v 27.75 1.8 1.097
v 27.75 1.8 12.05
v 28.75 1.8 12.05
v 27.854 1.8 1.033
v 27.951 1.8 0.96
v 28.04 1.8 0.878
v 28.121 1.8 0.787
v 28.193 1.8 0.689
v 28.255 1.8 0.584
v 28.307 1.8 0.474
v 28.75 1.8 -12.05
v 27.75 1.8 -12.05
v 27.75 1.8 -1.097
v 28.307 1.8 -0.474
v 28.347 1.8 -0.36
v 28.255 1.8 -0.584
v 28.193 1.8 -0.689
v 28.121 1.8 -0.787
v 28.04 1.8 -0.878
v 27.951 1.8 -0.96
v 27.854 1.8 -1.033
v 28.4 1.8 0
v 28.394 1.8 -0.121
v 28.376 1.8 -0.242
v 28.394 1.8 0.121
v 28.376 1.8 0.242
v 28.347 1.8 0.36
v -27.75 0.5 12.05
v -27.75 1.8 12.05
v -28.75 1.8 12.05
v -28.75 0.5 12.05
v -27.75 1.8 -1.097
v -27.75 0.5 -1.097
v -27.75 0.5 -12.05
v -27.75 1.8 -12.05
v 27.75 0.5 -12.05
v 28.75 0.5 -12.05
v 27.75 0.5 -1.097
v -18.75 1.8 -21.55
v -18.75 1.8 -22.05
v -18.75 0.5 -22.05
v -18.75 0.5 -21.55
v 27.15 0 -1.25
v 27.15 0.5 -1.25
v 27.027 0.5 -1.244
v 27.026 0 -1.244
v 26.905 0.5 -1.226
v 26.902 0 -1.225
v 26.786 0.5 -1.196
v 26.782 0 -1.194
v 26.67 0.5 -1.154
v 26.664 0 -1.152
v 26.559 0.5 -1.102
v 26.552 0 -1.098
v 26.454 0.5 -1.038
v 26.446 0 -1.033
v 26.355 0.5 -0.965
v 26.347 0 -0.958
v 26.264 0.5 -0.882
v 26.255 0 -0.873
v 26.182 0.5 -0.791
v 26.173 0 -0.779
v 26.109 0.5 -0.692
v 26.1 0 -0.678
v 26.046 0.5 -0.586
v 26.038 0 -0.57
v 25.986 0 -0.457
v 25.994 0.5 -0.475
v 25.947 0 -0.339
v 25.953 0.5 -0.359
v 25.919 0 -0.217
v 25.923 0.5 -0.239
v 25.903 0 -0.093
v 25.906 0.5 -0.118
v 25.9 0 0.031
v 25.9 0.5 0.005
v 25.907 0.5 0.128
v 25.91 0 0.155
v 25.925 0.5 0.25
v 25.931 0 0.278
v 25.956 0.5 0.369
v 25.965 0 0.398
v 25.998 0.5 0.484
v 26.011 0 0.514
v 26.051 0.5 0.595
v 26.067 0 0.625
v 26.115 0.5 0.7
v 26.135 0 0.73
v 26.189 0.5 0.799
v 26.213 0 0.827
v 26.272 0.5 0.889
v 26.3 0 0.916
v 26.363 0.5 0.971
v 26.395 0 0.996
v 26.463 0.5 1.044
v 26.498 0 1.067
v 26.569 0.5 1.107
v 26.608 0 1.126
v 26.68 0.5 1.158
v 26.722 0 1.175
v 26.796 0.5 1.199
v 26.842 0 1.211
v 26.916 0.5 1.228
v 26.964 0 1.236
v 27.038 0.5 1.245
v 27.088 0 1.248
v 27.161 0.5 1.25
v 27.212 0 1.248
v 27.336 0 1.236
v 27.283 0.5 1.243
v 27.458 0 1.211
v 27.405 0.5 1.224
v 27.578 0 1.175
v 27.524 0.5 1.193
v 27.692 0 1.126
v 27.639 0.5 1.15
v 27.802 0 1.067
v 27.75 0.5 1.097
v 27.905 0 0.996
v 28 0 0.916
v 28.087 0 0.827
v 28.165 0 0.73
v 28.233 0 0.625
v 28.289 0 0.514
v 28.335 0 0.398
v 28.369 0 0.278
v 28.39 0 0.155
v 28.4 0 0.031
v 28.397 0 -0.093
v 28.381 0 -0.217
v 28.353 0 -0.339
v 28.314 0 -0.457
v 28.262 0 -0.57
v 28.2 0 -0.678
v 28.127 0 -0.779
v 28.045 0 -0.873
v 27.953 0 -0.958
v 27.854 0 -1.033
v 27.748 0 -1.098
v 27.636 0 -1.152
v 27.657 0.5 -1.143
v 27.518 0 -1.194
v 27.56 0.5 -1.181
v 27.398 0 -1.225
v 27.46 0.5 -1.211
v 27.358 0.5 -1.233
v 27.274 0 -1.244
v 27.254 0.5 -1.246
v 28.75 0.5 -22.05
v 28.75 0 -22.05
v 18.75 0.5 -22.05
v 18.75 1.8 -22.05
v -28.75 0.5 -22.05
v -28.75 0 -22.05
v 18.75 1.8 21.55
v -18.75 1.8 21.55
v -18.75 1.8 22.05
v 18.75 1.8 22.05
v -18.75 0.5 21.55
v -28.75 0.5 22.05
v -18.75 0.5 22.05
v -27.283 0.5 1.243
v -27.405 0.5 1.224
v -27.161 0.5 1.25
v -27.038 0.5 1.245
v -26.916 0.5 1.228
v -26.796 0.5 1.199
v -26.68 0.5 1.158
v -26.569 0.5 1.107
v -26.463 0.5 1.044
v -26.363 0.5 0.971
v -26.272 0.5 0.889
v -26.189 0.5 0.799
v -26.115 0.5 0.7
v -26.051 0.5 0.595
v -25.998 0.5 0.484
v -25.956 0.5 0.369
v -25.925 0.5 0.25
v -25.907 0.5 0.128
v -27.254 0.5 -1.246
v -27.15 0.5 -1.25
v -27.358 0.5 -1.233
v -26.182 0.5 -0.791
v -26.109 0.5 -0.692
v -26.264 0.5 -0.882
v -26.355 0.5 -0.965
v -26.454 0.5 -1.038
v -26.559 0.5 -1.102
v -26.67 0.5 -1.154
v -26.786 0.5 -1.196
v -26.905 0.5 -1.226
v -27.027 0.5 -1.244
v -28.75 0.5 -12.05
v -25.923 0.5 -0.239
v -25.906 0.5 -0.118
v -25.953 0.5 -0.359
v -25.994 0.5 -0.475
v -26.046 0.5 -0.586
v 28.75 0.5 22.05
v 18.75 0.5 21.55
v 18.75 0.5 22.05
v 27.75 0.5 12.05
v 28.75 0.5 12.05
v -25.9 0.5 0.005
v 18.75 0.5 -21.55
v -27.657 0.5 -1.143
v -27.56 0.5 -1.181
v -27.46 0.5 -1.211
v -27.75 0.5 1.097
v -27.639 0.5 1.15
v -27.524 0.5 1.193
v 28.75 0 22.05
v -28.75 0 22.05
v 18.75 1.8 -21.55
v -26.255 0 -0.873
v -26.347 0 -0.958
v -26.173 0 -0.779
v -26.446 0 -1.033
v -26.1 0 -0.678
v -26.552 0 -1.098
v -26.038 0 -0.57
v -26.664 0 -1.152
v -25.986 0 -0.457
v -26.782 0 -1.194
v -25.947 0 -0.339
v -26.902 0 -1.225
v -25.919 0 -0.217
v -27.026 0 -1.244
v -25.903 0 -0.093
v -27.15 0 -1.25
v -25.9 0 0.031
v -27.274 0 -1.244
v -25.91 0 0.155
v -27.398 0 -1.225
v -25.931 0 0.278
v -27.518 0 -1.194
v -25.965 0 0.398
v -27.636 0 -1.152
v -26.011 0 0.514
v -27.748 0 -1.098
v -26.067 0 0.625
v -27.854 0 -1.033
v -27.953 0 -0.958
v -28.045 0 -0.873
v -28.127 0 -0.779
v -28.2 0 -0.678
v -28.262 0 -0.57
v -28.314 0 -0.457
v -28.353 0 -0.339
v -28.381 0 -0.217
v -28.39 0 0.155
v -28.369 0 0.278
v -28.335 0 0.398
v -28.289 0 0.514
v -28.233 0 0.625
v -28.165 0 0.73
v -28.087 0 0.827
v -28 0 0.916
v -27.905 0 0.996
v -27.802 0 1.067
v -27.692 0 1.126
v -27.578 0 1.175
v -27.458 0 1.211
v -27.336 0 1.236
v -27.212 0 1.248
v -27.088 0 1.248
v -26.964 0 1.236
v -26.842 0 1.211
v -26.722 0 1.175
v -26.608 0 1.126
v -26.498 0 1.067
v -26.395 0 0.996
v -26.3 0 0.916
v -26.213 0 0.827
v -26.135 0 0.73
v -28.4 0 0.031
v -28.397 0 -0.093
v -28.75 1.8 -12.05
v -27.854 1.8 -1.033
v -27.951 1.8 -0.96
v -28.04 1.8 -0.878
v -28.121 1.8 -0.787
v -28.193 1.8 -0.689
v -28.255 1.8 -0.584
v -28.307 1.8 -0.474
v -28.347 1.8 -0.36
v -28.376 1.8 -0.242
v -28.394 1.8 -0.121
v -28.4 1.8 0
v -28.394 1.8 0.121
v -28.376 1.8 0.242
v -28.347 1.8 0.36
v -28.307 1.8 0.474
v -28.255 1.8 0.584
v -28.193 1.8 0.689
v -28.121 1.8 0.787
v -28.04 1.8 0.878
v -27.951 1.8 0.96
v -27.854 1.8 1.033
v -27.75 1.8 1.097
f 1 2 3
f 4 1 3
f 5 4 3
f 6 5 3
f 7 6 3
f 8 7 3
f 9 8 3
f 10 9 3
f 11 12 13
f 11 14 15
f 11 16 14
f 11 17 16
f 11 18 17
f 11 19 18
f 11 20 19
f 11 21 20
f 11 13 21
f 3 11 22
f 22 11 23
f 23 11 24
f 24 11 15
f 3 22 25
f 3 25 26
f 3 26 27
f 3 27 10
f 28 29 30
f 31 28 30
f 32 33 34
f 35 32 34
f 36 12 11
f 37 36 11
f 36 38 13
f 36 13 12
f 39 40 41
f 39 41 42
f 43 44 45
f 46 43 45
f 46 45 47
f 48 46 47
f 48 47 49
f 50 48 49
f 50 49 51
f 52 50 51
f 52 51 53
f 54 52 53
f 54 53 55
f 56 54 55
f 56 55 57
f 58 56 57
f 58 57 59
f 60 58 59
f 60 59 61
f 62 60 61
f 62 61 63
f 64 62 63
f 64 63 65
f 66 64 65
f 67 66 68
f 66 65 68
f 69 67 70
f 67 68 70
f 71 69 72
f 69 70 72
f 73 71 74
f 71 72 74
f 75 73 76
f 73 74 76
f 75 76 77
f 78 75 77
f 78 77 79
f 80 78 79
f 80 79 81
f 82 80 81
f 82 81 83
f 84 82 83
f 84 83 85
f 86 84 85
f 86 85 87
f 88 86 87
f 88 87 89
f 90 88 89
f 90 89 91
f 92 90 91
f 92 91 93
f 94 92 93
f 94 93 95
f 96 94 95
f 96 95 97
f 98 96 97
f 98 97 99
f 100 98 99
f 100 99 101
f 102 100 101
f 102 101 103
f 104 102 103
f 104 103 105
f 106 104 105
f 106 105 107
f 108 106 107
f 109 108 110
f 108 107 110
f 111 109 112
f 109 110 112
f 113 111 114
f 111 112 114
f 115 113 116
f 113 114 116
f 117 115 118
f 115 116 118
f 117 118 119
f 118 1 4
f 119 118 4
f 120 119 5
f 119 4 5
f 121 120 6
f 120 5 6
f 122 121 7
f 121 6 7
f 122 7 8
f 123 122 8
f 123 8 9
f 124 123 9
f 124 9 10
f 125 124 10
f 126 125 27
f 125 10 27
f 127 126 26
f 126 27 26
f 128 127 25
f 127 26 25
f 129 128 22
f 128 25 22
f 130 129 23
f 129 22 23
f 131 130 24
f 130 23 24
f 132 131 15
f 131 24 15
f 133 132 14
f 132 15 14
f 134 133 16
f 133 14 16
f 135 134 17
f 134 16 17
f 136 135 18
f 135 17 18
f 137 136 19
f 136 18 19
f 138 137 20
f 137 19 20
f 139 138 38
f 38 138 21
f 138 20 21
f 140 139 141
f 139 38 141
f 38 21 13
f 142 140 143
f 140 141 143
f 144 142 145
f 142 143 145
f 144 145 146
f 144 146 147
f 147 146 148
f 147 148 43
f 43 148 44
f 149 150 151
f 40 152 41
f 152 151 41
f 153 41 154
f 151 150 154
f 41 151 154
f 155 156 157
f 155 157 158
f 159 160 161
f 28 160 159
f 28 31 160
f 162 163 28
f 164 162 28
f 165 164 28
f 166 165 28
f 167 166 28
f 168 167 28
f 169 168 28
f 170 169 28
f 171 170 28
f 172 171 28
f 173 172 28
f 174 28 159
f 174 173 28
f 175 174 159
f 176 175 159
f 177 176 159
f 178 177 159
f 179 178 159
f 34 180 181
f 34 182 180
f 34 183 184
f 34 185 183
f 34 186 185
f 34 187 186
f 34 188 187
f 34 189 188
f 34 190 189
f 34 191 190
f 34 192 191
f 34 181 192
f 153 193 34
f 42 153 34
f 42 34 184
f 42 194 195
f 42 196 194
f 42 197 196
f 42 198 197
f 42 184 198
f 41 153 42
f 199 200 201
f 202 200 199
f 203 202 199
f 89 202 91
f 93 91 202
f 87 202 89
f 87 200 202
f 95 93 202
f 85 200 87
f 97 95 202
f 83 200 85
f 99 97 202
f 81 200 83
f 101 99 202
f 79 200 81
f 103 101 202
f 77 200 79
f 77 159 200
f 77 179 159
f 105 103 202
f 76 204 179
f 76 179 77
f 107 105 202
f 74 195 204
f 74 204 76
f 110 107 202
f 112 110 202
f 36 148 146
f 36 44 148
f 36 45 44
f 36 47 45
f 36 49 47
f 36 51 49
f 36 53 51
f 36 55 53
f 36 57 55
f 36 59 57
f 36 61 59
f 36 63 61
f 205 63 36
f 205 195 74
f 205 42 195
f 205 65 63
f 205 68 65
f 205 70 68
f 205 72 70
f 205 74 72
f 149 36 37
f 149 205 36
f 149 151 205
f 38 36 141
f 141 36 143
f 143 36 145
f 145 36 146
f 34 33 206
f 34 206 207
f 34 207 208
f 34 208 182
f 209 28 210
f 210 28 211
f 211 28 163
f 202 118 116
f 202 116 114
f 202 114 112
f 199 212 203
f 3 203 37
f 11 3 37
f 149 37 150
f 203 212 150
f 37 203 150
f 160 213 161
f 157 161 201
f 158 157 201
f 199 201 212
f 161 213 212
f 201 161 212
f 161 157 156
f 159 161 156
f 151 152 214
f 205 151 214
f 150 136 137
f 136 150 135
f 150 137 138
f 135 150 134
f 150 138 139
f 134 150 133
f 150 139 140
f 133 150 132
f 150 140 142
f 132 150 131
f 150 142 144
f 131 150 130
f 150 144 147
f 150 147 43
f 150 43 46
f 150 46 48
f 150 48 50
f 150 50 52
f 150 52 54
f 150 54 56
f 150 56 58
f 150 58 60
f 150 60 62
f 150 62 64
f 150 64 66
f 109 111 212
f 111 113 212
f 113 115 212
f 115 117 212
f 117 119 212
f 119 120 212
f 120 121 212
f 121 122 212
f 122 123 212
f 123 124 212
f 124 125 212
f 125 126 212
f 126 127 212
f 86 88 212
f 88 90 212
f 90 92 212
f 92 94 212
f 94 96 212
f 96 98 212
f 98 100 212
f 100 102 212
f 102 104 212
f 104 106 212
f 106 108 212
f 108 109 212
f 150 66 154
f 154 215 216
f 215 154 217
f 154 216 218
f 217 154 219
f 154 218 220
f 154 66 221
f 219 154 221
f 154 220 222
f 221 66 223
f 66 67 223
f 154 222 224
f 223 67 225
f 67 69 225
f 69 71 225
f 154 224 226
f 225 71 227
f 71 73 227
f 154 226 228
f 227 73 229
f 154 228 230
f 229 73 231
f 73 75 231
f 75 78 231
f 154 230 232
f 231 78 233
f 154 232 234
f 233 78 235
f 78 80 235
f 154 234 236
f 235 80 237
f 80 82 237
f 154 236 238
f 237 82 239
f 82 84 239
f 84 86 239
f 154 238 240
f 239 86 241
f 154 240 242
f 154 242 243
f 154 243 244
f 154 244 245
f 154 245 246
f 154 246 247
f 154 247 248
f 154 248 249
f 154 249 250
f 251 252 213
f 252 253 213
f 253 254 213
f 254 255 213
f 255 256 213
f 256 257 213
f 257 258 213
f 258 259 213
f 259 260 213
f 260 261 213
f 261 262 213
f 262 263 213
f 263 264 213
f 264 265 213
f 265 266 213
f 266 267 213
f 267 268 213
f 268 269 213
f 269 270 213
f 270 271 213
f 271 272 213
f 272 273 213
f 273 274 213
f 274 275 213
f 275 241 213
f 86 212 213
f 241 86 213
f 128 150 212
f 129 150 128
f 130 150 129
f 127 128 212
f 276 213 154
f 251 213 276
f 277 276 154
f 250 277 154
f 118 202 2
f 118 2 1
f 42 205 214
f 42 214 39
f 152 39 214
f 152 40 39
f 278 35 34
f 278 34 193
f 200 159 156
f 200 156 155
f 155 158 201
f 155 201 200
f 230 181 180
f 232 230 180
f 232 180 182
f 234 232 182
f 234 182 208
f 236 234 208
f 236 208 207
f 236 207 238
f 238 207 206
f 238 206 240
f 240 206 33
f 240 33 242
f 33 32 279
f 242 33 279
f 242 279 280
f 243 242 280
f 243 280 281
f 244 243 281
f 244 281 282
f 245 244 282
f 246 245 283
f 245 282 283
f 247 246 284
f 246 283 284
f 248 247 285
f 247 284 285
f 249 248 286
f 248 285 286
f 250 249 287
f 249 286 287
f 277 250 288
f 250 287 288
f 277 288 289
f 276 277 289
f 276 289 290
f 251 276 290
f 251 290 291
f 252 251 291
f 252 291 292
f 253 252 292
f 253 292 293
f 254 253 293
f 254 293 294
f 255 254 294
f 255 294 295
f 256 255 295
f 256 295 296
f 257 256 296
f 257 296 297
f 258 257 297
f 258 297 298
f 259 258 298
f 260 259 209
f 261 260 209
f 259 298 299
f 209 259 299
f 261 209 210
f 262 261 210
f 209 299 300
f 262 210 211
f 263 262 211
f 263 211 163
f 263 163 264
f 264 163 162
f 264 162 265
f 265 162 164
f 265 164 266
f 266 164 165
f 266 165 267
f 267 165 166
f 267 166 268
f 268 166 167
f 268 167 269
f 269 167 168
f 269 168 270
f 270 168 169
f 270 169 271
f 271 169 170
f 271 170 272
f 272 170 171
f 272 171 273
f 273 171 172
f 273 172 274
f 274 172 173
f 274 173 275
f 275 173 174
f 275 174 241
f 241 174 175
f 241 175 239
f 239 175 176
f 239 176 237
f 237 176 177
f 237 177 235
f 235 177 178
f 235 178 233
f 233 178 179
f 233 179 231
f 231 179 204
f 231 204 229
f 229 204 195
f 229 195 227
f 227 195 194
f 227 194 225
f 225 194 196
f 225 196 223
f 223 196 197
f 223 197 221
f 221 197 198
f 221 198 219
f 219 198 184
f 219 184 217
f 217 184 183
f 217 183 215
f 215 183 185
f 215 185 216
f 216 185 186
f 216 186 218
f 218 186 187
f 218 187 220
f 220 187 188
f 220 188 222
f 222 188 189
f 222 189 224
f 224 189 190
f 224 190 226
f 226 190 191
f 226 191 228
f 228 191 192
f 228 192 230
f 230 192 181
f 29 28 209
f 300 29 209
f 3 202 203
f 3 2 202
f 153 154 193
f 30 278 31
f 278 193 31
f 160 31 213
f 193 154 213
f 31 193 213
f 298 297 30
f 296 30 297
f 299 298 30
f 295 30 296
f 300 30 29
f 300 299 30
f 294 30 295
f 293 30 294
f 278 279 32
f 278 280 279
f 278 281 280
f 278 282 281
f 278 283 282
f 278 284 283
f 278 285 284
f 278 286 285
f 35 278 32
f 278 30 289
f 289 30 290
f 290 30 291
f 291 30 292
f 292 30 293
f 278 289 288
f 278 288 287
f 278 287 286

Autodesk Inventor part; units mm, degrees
ref_plane "YZ Plane" through (0, 0, 0) normal (1, 0, 0) x (0, 1, 0)
ref_plane "XZ Plane" through (0, 0, 0) normal (0, 1, 0) x (-1, 0, 0)
ref_plane "XY Plane" through (0, 0, 0) normal (0, 0, 1) x (1, 0, 0)
sketch "Sketch1" plane through (0, 0, 0) normal (0, 1, 0) x (-1, 0, 0)
  line L0 (-28.75, -22.05) -> (28.75, -22.05)
  line L1 (28.75, -22.05) -> (28.75, 22.05)
  line L2 (28.75, 22.05) -> (-28.75, 22.05)
  line L3 (-28.75, 22.05) -> (-28.75, -22.05)
  line L4 (-28.75, -22.05) -> (28.75, 22.05) construction
  line L5 (28.75, -22.05) -> (-28.75, 22.05) construction
  point P0 (0, 0)
  dimension "d2" = 44.1
  dimension "d3" = 57.5
extrude "Extrusion1" add sketch "Sketch1" along normal blind 0.5
sketch "Sketch2" plane through (0, 0.5, 0) normal (0, 1, 0) x (1, 0, 0)
  line L0 (-28.75, 22.05) -> (-28.75, -22.05) projected
  line L1 (28.75, 22.05) -> (-28.75, 22.05) projected
  line L2 (-28.75, -22.05) -> (-27.75, -22.05)
  line L3 (-27.75, -22.05) -> (-27.75, 22.05)
  line L4 (-27.75, 22.05) -> (-28.75, 22.05)
  line L5 (-28.75, 22.05) -> (-28.75, -22.05)
  line L6 (28.75, -22.05) -> (27.75, -22.05)
  line L7 (27.75, -22.05) -> (27.75, 22.05)
  line L8 (27.75, 22.05) -> (28.75, 22.05)
  line L9 (28.75, 22.05) -> (28.75, -22.05)
  point P0 (0, 0)
  dimension "d4" = 1
  dimension "d5" = 1
extrude "Extrusion2" add sketch "Sketch2" along normal blind 1.3
sketch "Sketch3" plane through (0, 0, 0) normal (0, -1, 0) x (1, 0, 0)
  line L0 (28.75, 22.05) -> (28.75, -22.05) projected
  line L1 (-28.75, -22.05) -> (-28.75, 22.05) projected
  point P0 (0, 0)
  point P1 (-27.15, 0)
  point P2 (27.15, 0)
  dimension "d8" = 1.6
  dimension "d9" = 1.6
hole "Hole1" at (-27.15, 0, 0) at (27.15, 0, 0) direction (0, 1, 0) diameter 2.5 depth 6.3 tip angle 118
sketch "Sketch4" plane through (0, 0.5, 0) normal (0, 1, 0) x (1, 0, 0)
  line L0 (27.75, -22.05) -> (28.75, -22.05) projected
  line L1 (-27.75, -1.0966) -> (-27.75, -22.05) projected
  line L2 (27.75, -22.05) -> (-27.75, -22.05)
  line L3 (-27.75, -22.05) -> (-27.75, -21.55)
  line L4 (-27.75, -21.55) -> (27.75, -21.55)
  line L5 (27.75, -21.55) -> (27.75, -22.05)
  line L6 (-27.75, 22.05) -> (27.75, 22.05)
  line L7 (27.75, 22.05) -> (27.75, 21.55)
  line L8 (27.75, 21.55) -> (-27.75, 21.55)
  line L9 (-27.75, 21.55) -> (-27.75, 22.05)
  point P0 (0, 0)
  dimension "d17" = 0.5
  dimension "d18" = 0.5
extrude "Extrusion3" add sketch "Sketch4" along normal blind 1.3
sketch "Sketch5" plane through (0, 1.8, 0) normal (0, 1, 0) x (1, 0, 0)
  line L0 (28.75, -22.05) -> (28.75, 22.05) projected
  line L1 (28.75, -22.05) -> (18.75, -22.05)
  line L2 (18.75, -22.05) -> (18.75, -12.05)
  line L3 (18.75, -12.05) -> (28.75, -12.05)
  line L4 (28.75, -12.05) -> (28.75, -22.05)
  line L5 (28.75, 22.05) -> (18.75, 22.05)
  line L6 (18.75, 22.05) -> (18.75, 12.05)
  line L7 (18.75, 12.05) -> (28.75, 12.05)
  line L8 (28.75, 12.05) -> (28.75, 22.05)
  line L9 (-28.75, 22.05) -> (-18.75, 22.05)
  line L10 (-18.75, 22.05) -> (-18.75, 12.05)
  line L11 (-18.75, 12.05) -> (-28.75, 12.05)
  line L12 (-28.75, 12.05) -> (-28.75, 22.05)
  line L13 (-28.75, -22.05) -> (-18.75, -22.05)
  line L14 (-18.75, -22.05) -> (-18.75, -12.05)
  line L15 (-18.75, -12.05) -> (-28.75, -12.05)
  line L16 (-28.75, -12.05) -> (-28.75, -22.05)
  point P0 (0, 0)
  dimension "d21" = 10
  dimension "d22" = 10
  dimension "d23" = 10
  dimension "d24" = 10
  dimension "d25" = 10
  dimension "d26" = 10
  dimension "d27" = 10
  dimension "d28" = 10
extrude "Extrusion4" cut sketch "Sketch5" against normal up to surface (1.3 mm away)
equation "\"d5\" = d4"
equation "\"d18\" = d17"
equation "\"d23\" = d21"
equation "\"d24\" = d21"
equation "\"d25\" = d21"
equation "\"d26\" = d22"
equation "\"d27\" = d22"
equation "\"d28\" = d22"
properties part number "Digital Module Cover V2 - Slim"
